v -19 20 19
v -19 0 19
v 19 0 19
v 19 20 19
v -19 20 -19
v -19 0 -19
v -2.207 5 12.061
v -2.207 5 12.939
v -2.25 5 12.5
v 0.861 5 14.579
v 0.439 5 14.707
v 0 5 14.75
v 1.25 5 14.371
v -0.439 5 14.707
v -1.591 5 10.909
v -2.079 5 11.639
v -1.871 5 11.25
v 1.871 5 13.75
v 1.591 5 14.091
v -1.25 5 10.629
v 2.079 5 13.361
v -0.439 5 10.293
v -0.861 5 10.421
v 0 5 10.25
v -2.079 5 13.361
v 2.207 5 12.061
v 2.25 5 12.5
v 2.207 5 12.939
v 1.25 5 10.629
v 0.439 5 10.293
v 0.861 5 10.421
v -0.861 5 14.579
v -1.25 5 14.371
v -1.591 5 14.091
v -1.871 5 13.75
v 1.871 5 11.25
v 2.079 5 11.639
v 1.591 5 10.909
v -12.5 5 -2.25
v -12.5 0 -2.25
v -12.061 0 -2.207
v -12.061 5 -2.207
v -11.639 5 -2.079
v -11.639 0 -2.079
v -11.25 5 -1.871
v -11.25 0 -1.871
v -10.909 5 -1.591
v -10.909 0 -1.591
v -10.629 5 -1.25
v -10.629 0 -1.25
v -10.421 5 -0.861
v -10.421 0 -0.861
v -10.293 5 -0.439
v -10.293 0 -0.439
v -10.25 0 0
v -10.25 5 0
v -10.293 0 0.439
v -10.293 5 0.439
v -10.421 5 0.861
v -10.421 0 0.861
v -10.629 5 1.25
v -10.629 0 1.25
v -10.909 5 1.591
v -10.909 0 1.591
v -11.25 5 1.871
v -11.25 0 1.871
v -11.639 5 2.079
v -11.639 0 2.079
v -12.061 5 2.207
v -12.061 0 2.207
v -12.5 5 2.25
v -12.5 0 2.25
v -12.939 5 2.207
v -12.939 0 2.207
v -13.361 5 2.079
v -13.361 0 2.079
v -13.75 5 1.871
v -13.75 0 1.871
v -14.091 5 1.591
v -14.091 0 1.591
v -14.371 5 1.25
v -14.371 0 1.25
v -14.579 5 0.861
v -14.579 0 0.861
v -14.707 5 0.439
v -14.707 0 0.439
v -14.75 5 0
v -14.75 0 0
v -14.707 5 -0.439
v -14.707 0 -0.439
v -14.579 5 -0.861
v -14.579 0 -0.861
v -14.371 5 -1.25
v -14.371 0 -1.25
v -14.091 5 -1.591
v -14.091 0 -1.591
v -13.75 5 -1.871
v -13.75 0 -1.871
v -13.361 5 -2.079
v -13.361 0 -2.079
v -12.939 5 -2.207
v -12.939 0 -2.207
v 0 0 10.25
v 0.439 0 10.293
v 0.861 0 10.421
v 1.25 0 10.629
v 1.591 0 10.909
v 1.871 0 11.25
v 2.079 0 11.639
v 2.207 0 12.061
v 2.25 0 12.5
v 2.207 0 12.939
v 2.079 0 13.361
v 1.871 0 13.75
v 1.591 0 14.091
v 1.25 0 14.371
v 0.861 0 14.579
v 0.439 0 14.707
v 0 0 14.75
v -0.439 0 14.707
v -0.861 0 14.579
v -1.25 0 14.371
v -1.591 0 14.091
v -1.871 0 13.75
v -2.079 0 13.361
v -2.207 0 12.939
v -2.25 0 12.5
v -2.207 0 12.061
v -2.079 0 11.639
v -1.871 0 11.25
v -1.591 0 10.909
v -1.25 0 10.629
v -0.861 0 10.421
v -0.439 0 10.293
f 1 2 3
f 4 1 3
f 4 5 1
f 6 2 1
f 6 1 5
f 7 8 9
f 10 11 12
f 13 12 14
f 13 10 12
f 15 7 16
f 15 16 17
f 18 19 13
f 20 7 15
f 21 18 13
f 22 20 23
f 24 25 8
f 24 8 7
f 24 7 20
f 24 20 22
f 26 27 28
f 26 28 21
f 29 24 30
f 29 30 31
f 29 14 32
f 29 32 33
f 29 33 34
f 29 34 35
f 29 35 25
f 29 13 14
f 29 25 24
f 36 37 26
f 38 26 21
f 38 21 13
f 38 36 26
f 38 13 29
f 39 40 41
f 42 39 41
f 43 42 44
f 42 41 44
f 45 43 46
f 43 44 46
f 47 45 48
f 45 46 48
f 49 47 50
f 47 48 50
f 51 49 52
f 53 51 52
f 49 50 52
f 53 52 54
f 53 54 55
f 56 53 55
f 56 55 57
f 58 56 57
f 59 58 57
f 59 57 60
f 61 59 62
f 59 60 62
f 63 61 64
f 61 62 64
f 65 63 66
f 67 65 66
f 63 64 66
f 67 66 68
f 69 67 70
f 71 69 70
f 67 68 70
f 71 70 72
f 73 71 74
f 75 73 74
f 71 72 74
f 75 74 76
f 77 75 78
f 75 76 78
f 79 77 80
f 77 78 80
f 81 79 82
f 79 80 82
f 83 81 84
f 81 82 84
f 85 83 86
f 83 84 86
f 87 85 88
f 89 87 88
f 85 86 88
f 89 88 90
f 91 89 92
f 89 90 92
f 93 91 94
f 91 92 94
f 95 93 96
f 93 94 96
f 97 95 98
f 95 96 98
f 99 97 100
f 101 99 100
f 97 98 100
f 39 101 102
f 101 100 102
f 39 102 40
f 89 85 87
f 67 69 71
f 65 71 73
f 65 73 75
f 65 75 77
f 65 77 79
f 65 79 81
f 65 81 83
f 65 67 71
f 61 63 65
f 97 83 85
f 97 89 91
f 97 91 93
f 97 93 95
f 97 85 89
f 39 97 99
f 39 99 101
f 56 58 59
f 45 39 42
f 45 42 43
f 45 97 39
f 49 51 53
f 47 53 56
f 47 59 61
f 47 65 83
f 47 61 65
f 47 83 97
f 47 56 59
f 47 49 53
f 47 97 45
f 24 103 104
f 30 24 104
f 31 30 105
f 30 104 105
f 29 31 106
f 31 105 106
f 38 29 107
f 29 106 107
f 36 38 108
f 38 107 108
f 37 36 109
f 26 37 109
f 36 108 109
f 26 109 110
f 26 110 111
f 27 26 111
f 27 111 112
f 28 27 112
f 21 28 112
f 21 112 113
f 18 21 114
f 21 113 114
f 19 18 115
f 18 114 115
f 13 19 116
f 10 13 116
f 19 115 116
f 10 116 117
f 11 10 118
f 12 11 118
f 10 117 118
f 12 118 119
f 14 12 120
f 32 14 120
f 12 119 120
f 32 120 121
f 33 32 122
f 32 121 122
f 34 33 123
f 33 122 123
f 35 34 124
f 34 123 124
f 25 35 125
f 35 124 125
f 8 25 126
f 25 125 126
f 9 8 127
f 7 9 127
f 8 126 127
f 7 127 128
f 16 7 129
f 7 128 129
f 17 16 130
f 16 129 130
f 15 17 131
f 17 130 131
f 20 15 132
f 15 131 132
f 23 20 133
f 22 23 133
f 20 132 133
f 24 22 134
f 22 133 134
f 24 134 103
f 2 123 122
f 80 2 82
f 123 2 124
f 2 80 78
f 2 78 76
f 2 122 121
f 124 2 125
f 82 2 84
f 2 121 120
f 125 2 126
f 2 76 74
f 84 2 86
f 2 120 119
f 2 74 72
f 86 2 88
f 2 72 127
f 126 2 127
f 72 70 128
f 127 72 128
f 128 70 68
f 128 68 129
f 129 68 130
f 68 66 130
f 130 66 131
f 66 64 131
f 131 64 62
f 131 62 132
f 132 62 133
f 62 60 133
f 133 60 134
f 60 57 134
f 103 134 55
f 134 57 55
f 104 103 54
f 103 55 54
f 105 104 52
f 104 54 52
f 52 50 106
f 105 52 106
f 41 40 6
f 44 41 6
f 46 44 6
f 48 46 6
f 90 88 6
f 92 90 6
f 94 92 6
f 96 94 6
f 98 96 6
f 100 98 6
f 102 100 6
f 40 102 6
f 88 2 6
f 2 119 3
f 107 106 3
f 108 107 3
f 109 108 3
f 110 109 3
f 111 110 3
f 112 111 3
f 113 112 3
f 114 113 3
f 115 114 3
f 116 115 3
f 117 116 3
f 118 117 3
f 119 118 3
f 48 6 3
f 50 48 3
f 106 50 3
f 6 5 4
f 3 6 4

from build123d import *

# Parameters (mm, degrees)
SKETCH2_W           = 38
SKETCH2_H           = 38
BOSS_EXTRUDE1_DEPTH = 20
CUT_EXTRUDE1_DEPTH  = 20
SKETCH7_R           = 2.25
CUT_EXTRUDE2_DEPTH  = 5


with BuildPart() as part:
    # Sketch2 → Boss-Extrude1 (new body)
    with BuildSketch(Plane(origin=(0, 0, 0), x_dir=(1, 0, 0), z_dir=(0, 1, 0))):
        Rectangle(SKETCH2_W, SKETCH2_H)
    extrude(amount=BOSS_EXTRUDE1_DEPTH)

    # Sketch3 → Cut-Extrude1 (cut)
    with BuildSketch(Plane(origin=(0, 20, 0), x_dir=(1, 0, 0), z_dir=(0, 1, 0))):
        Polygon((-19, 19), (19, -19), (19, 19), align=None)
    extrude(amount=-CUT_EXTRUDE1_DEPTH, mode=Mode.SUBTRACT)

    # Sketch7 → Cut-Extrude2 (cut)
    with BuildSketch(Plane(origin=(0, 0, 0), x_dir=(-1, 0, 0), z_dir=(0, -1, 0))):
        with Locations(Location((12.5, 0, 0), (0, 0, 90))):
            Circle(SKETCH7_R)
        with Locations(Location((0, -12.5, 0), (0, 0, 90))):
            Circle(SKETCH7_R)
    extrude(amount=-CUT_EXTRUDE2_DEPTH, mode=Mode.SUBTRACT)


solid = part.part
